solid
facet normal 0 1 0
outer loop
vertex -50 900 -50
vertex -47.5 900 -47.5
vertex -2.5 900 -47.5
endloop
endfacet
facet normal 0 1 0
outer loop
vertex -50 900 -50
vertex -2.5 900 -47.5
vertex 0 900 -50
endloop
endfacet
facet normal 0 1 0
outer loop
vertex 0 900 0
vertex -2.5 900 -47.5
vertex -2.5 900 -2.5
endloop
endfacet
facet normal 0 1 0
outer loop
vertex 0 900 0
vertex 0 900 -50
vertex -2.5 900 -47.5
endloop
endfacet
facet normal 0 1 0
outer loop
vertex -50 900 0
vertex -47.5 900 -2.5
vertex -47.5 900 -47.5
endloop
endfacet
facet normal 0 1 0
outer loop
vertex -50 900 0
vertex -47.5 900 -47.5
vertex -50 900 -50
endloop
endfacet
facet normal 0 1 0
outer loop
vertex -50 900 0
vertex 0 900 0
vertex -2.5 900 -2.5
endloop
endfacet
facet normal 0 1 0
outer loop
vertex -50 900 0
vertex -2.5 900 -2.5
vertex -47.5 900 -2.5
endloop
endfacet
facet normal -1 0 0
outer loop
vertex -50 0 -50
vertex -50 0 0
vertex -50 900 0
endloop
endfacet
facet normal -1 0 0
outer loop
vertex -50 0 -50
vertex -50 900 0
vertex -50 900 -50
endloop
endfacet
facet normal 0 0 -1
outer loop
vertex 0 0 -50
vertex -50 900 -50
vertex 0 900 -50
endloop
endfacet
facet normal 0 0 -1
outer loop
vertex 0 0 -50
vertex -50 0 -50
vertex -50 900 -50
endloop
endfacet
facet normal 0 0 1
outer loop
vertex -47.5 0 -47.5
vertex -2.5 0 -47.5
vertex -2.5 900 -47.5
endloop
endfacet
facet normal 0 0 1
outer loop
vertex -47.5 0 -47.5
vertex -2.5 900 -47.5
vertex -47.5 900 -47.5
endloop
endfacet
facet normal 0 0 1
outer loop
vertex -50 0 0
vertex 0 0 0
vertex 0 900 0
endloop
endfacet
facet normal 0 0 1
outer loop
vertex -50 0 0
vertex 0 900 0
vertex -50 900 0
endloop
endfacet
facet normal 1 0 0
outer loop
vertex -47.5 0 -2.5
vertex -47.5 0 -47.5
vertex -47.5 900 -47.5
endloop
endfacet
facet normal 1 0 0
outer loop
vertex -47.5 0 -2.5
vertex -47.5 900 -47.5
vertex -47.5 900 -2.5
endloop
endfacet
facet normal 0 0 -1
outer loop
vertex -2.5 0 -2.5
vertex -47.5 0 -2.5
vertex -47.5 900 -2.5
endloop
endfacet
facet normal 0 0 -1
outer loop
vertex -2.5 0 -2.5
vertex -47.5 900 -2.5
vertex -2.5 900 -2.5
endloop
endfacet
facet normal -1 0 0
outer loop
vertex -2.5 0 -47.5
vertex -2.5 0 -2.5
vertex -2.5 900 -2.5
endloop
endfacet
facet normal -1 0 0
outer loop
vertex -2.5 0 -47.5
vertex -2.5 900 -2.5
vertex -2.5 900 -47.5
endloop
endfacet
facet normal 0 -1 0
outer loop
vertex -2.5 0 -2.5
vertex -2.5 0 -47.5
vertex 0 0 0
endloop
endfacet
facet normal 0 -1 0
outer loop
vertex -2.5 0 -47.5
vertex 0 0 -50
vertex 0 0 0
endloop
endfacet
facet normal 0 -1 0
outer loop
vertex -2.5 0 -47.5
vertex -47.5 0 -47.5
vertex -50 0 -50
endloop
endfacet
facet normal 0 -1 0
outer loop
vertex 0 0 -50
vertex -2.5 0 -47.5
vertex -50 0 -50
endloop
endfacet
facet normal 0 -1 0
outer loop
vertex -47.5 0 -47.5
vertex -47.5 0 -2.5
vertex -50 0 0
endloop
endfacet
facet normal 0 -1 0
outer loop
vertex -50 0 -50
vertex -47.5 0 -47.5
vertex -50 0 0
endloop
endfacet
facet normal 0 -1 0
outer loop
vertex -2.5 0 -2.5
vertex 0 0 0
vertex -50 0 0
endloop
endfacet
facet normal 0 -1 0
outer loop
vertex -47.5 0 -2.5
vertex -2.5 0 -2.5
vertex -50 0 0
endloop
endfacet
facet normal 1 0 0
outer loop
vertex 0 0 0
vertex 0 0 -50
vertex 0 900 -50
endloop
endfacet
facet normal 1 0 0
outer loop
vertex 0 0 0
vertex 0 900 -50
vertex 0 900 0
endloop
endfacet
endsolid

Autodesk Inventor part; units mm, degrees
ref_plane "YZ Plane" through (0, 0, 0) normal (1, 0, 0) x (0, 1, 0)
ref_plane "XZ Plane" through (0, 0, 0) normal (0, 1, 0) x (-1, 0, 0)
ref_plane "XY Plane" through (0, 0, 0) normal (0, 0, 1) x (1, 0, 0)
sketch "Sketch1" plane through (0, 0, 0) normal (0, 1, 0) x (-1, 0, 0)
  line L0 (0, 0) -> (50, 0)
  line L1 (50, 0) -> (50, -50)
  line L2 (50, -50) -> (0, -50)
  line L3 (0, -50) -> (0, 0)
  dimension "d0" = 50
  dimension "d1" = 50
extrude "Extrusion1" add sketch "Sketch1" along normal blind 900
sketch "Sketch2" plane through (0, 900, 0) normal (0, 1, 0) x (1, 0, 0)
  line L0 (0, 50) -> (-50, 50) projected
  line L1 (-50, 50) -> (-50, 0) projected
  line L2 (-50, 0) -> (0, 0) projected
  line L3 (0, 0) -> (0, 50) projected
  line L4 (-47.5, 2.5) -> (-2.5, 2.5)
  line L5 (-2.5, 2.5) -> (-2.5, 47.5)
  line L6 (-2.5, 47.5) -> (-47.5, 47.5)
  line L7 (-47.5, 47.5) -> (-47.5, 2.5)
  line L8 (-47.5, 2.5) -> (-2.5, 47.5) construction
  line L9 (-2.5, 2.5) -> (-47.5, 47.5) construction
  point P0 (-25, 25)
  dimension "d4" = 45
  dimension "d5" = 45
extrude "Extrusion2" cut sketch "Sketch2" against normal up to surface (900 mm away) contours L7 L6 L5 L4
properties part number "metalonmeio"
